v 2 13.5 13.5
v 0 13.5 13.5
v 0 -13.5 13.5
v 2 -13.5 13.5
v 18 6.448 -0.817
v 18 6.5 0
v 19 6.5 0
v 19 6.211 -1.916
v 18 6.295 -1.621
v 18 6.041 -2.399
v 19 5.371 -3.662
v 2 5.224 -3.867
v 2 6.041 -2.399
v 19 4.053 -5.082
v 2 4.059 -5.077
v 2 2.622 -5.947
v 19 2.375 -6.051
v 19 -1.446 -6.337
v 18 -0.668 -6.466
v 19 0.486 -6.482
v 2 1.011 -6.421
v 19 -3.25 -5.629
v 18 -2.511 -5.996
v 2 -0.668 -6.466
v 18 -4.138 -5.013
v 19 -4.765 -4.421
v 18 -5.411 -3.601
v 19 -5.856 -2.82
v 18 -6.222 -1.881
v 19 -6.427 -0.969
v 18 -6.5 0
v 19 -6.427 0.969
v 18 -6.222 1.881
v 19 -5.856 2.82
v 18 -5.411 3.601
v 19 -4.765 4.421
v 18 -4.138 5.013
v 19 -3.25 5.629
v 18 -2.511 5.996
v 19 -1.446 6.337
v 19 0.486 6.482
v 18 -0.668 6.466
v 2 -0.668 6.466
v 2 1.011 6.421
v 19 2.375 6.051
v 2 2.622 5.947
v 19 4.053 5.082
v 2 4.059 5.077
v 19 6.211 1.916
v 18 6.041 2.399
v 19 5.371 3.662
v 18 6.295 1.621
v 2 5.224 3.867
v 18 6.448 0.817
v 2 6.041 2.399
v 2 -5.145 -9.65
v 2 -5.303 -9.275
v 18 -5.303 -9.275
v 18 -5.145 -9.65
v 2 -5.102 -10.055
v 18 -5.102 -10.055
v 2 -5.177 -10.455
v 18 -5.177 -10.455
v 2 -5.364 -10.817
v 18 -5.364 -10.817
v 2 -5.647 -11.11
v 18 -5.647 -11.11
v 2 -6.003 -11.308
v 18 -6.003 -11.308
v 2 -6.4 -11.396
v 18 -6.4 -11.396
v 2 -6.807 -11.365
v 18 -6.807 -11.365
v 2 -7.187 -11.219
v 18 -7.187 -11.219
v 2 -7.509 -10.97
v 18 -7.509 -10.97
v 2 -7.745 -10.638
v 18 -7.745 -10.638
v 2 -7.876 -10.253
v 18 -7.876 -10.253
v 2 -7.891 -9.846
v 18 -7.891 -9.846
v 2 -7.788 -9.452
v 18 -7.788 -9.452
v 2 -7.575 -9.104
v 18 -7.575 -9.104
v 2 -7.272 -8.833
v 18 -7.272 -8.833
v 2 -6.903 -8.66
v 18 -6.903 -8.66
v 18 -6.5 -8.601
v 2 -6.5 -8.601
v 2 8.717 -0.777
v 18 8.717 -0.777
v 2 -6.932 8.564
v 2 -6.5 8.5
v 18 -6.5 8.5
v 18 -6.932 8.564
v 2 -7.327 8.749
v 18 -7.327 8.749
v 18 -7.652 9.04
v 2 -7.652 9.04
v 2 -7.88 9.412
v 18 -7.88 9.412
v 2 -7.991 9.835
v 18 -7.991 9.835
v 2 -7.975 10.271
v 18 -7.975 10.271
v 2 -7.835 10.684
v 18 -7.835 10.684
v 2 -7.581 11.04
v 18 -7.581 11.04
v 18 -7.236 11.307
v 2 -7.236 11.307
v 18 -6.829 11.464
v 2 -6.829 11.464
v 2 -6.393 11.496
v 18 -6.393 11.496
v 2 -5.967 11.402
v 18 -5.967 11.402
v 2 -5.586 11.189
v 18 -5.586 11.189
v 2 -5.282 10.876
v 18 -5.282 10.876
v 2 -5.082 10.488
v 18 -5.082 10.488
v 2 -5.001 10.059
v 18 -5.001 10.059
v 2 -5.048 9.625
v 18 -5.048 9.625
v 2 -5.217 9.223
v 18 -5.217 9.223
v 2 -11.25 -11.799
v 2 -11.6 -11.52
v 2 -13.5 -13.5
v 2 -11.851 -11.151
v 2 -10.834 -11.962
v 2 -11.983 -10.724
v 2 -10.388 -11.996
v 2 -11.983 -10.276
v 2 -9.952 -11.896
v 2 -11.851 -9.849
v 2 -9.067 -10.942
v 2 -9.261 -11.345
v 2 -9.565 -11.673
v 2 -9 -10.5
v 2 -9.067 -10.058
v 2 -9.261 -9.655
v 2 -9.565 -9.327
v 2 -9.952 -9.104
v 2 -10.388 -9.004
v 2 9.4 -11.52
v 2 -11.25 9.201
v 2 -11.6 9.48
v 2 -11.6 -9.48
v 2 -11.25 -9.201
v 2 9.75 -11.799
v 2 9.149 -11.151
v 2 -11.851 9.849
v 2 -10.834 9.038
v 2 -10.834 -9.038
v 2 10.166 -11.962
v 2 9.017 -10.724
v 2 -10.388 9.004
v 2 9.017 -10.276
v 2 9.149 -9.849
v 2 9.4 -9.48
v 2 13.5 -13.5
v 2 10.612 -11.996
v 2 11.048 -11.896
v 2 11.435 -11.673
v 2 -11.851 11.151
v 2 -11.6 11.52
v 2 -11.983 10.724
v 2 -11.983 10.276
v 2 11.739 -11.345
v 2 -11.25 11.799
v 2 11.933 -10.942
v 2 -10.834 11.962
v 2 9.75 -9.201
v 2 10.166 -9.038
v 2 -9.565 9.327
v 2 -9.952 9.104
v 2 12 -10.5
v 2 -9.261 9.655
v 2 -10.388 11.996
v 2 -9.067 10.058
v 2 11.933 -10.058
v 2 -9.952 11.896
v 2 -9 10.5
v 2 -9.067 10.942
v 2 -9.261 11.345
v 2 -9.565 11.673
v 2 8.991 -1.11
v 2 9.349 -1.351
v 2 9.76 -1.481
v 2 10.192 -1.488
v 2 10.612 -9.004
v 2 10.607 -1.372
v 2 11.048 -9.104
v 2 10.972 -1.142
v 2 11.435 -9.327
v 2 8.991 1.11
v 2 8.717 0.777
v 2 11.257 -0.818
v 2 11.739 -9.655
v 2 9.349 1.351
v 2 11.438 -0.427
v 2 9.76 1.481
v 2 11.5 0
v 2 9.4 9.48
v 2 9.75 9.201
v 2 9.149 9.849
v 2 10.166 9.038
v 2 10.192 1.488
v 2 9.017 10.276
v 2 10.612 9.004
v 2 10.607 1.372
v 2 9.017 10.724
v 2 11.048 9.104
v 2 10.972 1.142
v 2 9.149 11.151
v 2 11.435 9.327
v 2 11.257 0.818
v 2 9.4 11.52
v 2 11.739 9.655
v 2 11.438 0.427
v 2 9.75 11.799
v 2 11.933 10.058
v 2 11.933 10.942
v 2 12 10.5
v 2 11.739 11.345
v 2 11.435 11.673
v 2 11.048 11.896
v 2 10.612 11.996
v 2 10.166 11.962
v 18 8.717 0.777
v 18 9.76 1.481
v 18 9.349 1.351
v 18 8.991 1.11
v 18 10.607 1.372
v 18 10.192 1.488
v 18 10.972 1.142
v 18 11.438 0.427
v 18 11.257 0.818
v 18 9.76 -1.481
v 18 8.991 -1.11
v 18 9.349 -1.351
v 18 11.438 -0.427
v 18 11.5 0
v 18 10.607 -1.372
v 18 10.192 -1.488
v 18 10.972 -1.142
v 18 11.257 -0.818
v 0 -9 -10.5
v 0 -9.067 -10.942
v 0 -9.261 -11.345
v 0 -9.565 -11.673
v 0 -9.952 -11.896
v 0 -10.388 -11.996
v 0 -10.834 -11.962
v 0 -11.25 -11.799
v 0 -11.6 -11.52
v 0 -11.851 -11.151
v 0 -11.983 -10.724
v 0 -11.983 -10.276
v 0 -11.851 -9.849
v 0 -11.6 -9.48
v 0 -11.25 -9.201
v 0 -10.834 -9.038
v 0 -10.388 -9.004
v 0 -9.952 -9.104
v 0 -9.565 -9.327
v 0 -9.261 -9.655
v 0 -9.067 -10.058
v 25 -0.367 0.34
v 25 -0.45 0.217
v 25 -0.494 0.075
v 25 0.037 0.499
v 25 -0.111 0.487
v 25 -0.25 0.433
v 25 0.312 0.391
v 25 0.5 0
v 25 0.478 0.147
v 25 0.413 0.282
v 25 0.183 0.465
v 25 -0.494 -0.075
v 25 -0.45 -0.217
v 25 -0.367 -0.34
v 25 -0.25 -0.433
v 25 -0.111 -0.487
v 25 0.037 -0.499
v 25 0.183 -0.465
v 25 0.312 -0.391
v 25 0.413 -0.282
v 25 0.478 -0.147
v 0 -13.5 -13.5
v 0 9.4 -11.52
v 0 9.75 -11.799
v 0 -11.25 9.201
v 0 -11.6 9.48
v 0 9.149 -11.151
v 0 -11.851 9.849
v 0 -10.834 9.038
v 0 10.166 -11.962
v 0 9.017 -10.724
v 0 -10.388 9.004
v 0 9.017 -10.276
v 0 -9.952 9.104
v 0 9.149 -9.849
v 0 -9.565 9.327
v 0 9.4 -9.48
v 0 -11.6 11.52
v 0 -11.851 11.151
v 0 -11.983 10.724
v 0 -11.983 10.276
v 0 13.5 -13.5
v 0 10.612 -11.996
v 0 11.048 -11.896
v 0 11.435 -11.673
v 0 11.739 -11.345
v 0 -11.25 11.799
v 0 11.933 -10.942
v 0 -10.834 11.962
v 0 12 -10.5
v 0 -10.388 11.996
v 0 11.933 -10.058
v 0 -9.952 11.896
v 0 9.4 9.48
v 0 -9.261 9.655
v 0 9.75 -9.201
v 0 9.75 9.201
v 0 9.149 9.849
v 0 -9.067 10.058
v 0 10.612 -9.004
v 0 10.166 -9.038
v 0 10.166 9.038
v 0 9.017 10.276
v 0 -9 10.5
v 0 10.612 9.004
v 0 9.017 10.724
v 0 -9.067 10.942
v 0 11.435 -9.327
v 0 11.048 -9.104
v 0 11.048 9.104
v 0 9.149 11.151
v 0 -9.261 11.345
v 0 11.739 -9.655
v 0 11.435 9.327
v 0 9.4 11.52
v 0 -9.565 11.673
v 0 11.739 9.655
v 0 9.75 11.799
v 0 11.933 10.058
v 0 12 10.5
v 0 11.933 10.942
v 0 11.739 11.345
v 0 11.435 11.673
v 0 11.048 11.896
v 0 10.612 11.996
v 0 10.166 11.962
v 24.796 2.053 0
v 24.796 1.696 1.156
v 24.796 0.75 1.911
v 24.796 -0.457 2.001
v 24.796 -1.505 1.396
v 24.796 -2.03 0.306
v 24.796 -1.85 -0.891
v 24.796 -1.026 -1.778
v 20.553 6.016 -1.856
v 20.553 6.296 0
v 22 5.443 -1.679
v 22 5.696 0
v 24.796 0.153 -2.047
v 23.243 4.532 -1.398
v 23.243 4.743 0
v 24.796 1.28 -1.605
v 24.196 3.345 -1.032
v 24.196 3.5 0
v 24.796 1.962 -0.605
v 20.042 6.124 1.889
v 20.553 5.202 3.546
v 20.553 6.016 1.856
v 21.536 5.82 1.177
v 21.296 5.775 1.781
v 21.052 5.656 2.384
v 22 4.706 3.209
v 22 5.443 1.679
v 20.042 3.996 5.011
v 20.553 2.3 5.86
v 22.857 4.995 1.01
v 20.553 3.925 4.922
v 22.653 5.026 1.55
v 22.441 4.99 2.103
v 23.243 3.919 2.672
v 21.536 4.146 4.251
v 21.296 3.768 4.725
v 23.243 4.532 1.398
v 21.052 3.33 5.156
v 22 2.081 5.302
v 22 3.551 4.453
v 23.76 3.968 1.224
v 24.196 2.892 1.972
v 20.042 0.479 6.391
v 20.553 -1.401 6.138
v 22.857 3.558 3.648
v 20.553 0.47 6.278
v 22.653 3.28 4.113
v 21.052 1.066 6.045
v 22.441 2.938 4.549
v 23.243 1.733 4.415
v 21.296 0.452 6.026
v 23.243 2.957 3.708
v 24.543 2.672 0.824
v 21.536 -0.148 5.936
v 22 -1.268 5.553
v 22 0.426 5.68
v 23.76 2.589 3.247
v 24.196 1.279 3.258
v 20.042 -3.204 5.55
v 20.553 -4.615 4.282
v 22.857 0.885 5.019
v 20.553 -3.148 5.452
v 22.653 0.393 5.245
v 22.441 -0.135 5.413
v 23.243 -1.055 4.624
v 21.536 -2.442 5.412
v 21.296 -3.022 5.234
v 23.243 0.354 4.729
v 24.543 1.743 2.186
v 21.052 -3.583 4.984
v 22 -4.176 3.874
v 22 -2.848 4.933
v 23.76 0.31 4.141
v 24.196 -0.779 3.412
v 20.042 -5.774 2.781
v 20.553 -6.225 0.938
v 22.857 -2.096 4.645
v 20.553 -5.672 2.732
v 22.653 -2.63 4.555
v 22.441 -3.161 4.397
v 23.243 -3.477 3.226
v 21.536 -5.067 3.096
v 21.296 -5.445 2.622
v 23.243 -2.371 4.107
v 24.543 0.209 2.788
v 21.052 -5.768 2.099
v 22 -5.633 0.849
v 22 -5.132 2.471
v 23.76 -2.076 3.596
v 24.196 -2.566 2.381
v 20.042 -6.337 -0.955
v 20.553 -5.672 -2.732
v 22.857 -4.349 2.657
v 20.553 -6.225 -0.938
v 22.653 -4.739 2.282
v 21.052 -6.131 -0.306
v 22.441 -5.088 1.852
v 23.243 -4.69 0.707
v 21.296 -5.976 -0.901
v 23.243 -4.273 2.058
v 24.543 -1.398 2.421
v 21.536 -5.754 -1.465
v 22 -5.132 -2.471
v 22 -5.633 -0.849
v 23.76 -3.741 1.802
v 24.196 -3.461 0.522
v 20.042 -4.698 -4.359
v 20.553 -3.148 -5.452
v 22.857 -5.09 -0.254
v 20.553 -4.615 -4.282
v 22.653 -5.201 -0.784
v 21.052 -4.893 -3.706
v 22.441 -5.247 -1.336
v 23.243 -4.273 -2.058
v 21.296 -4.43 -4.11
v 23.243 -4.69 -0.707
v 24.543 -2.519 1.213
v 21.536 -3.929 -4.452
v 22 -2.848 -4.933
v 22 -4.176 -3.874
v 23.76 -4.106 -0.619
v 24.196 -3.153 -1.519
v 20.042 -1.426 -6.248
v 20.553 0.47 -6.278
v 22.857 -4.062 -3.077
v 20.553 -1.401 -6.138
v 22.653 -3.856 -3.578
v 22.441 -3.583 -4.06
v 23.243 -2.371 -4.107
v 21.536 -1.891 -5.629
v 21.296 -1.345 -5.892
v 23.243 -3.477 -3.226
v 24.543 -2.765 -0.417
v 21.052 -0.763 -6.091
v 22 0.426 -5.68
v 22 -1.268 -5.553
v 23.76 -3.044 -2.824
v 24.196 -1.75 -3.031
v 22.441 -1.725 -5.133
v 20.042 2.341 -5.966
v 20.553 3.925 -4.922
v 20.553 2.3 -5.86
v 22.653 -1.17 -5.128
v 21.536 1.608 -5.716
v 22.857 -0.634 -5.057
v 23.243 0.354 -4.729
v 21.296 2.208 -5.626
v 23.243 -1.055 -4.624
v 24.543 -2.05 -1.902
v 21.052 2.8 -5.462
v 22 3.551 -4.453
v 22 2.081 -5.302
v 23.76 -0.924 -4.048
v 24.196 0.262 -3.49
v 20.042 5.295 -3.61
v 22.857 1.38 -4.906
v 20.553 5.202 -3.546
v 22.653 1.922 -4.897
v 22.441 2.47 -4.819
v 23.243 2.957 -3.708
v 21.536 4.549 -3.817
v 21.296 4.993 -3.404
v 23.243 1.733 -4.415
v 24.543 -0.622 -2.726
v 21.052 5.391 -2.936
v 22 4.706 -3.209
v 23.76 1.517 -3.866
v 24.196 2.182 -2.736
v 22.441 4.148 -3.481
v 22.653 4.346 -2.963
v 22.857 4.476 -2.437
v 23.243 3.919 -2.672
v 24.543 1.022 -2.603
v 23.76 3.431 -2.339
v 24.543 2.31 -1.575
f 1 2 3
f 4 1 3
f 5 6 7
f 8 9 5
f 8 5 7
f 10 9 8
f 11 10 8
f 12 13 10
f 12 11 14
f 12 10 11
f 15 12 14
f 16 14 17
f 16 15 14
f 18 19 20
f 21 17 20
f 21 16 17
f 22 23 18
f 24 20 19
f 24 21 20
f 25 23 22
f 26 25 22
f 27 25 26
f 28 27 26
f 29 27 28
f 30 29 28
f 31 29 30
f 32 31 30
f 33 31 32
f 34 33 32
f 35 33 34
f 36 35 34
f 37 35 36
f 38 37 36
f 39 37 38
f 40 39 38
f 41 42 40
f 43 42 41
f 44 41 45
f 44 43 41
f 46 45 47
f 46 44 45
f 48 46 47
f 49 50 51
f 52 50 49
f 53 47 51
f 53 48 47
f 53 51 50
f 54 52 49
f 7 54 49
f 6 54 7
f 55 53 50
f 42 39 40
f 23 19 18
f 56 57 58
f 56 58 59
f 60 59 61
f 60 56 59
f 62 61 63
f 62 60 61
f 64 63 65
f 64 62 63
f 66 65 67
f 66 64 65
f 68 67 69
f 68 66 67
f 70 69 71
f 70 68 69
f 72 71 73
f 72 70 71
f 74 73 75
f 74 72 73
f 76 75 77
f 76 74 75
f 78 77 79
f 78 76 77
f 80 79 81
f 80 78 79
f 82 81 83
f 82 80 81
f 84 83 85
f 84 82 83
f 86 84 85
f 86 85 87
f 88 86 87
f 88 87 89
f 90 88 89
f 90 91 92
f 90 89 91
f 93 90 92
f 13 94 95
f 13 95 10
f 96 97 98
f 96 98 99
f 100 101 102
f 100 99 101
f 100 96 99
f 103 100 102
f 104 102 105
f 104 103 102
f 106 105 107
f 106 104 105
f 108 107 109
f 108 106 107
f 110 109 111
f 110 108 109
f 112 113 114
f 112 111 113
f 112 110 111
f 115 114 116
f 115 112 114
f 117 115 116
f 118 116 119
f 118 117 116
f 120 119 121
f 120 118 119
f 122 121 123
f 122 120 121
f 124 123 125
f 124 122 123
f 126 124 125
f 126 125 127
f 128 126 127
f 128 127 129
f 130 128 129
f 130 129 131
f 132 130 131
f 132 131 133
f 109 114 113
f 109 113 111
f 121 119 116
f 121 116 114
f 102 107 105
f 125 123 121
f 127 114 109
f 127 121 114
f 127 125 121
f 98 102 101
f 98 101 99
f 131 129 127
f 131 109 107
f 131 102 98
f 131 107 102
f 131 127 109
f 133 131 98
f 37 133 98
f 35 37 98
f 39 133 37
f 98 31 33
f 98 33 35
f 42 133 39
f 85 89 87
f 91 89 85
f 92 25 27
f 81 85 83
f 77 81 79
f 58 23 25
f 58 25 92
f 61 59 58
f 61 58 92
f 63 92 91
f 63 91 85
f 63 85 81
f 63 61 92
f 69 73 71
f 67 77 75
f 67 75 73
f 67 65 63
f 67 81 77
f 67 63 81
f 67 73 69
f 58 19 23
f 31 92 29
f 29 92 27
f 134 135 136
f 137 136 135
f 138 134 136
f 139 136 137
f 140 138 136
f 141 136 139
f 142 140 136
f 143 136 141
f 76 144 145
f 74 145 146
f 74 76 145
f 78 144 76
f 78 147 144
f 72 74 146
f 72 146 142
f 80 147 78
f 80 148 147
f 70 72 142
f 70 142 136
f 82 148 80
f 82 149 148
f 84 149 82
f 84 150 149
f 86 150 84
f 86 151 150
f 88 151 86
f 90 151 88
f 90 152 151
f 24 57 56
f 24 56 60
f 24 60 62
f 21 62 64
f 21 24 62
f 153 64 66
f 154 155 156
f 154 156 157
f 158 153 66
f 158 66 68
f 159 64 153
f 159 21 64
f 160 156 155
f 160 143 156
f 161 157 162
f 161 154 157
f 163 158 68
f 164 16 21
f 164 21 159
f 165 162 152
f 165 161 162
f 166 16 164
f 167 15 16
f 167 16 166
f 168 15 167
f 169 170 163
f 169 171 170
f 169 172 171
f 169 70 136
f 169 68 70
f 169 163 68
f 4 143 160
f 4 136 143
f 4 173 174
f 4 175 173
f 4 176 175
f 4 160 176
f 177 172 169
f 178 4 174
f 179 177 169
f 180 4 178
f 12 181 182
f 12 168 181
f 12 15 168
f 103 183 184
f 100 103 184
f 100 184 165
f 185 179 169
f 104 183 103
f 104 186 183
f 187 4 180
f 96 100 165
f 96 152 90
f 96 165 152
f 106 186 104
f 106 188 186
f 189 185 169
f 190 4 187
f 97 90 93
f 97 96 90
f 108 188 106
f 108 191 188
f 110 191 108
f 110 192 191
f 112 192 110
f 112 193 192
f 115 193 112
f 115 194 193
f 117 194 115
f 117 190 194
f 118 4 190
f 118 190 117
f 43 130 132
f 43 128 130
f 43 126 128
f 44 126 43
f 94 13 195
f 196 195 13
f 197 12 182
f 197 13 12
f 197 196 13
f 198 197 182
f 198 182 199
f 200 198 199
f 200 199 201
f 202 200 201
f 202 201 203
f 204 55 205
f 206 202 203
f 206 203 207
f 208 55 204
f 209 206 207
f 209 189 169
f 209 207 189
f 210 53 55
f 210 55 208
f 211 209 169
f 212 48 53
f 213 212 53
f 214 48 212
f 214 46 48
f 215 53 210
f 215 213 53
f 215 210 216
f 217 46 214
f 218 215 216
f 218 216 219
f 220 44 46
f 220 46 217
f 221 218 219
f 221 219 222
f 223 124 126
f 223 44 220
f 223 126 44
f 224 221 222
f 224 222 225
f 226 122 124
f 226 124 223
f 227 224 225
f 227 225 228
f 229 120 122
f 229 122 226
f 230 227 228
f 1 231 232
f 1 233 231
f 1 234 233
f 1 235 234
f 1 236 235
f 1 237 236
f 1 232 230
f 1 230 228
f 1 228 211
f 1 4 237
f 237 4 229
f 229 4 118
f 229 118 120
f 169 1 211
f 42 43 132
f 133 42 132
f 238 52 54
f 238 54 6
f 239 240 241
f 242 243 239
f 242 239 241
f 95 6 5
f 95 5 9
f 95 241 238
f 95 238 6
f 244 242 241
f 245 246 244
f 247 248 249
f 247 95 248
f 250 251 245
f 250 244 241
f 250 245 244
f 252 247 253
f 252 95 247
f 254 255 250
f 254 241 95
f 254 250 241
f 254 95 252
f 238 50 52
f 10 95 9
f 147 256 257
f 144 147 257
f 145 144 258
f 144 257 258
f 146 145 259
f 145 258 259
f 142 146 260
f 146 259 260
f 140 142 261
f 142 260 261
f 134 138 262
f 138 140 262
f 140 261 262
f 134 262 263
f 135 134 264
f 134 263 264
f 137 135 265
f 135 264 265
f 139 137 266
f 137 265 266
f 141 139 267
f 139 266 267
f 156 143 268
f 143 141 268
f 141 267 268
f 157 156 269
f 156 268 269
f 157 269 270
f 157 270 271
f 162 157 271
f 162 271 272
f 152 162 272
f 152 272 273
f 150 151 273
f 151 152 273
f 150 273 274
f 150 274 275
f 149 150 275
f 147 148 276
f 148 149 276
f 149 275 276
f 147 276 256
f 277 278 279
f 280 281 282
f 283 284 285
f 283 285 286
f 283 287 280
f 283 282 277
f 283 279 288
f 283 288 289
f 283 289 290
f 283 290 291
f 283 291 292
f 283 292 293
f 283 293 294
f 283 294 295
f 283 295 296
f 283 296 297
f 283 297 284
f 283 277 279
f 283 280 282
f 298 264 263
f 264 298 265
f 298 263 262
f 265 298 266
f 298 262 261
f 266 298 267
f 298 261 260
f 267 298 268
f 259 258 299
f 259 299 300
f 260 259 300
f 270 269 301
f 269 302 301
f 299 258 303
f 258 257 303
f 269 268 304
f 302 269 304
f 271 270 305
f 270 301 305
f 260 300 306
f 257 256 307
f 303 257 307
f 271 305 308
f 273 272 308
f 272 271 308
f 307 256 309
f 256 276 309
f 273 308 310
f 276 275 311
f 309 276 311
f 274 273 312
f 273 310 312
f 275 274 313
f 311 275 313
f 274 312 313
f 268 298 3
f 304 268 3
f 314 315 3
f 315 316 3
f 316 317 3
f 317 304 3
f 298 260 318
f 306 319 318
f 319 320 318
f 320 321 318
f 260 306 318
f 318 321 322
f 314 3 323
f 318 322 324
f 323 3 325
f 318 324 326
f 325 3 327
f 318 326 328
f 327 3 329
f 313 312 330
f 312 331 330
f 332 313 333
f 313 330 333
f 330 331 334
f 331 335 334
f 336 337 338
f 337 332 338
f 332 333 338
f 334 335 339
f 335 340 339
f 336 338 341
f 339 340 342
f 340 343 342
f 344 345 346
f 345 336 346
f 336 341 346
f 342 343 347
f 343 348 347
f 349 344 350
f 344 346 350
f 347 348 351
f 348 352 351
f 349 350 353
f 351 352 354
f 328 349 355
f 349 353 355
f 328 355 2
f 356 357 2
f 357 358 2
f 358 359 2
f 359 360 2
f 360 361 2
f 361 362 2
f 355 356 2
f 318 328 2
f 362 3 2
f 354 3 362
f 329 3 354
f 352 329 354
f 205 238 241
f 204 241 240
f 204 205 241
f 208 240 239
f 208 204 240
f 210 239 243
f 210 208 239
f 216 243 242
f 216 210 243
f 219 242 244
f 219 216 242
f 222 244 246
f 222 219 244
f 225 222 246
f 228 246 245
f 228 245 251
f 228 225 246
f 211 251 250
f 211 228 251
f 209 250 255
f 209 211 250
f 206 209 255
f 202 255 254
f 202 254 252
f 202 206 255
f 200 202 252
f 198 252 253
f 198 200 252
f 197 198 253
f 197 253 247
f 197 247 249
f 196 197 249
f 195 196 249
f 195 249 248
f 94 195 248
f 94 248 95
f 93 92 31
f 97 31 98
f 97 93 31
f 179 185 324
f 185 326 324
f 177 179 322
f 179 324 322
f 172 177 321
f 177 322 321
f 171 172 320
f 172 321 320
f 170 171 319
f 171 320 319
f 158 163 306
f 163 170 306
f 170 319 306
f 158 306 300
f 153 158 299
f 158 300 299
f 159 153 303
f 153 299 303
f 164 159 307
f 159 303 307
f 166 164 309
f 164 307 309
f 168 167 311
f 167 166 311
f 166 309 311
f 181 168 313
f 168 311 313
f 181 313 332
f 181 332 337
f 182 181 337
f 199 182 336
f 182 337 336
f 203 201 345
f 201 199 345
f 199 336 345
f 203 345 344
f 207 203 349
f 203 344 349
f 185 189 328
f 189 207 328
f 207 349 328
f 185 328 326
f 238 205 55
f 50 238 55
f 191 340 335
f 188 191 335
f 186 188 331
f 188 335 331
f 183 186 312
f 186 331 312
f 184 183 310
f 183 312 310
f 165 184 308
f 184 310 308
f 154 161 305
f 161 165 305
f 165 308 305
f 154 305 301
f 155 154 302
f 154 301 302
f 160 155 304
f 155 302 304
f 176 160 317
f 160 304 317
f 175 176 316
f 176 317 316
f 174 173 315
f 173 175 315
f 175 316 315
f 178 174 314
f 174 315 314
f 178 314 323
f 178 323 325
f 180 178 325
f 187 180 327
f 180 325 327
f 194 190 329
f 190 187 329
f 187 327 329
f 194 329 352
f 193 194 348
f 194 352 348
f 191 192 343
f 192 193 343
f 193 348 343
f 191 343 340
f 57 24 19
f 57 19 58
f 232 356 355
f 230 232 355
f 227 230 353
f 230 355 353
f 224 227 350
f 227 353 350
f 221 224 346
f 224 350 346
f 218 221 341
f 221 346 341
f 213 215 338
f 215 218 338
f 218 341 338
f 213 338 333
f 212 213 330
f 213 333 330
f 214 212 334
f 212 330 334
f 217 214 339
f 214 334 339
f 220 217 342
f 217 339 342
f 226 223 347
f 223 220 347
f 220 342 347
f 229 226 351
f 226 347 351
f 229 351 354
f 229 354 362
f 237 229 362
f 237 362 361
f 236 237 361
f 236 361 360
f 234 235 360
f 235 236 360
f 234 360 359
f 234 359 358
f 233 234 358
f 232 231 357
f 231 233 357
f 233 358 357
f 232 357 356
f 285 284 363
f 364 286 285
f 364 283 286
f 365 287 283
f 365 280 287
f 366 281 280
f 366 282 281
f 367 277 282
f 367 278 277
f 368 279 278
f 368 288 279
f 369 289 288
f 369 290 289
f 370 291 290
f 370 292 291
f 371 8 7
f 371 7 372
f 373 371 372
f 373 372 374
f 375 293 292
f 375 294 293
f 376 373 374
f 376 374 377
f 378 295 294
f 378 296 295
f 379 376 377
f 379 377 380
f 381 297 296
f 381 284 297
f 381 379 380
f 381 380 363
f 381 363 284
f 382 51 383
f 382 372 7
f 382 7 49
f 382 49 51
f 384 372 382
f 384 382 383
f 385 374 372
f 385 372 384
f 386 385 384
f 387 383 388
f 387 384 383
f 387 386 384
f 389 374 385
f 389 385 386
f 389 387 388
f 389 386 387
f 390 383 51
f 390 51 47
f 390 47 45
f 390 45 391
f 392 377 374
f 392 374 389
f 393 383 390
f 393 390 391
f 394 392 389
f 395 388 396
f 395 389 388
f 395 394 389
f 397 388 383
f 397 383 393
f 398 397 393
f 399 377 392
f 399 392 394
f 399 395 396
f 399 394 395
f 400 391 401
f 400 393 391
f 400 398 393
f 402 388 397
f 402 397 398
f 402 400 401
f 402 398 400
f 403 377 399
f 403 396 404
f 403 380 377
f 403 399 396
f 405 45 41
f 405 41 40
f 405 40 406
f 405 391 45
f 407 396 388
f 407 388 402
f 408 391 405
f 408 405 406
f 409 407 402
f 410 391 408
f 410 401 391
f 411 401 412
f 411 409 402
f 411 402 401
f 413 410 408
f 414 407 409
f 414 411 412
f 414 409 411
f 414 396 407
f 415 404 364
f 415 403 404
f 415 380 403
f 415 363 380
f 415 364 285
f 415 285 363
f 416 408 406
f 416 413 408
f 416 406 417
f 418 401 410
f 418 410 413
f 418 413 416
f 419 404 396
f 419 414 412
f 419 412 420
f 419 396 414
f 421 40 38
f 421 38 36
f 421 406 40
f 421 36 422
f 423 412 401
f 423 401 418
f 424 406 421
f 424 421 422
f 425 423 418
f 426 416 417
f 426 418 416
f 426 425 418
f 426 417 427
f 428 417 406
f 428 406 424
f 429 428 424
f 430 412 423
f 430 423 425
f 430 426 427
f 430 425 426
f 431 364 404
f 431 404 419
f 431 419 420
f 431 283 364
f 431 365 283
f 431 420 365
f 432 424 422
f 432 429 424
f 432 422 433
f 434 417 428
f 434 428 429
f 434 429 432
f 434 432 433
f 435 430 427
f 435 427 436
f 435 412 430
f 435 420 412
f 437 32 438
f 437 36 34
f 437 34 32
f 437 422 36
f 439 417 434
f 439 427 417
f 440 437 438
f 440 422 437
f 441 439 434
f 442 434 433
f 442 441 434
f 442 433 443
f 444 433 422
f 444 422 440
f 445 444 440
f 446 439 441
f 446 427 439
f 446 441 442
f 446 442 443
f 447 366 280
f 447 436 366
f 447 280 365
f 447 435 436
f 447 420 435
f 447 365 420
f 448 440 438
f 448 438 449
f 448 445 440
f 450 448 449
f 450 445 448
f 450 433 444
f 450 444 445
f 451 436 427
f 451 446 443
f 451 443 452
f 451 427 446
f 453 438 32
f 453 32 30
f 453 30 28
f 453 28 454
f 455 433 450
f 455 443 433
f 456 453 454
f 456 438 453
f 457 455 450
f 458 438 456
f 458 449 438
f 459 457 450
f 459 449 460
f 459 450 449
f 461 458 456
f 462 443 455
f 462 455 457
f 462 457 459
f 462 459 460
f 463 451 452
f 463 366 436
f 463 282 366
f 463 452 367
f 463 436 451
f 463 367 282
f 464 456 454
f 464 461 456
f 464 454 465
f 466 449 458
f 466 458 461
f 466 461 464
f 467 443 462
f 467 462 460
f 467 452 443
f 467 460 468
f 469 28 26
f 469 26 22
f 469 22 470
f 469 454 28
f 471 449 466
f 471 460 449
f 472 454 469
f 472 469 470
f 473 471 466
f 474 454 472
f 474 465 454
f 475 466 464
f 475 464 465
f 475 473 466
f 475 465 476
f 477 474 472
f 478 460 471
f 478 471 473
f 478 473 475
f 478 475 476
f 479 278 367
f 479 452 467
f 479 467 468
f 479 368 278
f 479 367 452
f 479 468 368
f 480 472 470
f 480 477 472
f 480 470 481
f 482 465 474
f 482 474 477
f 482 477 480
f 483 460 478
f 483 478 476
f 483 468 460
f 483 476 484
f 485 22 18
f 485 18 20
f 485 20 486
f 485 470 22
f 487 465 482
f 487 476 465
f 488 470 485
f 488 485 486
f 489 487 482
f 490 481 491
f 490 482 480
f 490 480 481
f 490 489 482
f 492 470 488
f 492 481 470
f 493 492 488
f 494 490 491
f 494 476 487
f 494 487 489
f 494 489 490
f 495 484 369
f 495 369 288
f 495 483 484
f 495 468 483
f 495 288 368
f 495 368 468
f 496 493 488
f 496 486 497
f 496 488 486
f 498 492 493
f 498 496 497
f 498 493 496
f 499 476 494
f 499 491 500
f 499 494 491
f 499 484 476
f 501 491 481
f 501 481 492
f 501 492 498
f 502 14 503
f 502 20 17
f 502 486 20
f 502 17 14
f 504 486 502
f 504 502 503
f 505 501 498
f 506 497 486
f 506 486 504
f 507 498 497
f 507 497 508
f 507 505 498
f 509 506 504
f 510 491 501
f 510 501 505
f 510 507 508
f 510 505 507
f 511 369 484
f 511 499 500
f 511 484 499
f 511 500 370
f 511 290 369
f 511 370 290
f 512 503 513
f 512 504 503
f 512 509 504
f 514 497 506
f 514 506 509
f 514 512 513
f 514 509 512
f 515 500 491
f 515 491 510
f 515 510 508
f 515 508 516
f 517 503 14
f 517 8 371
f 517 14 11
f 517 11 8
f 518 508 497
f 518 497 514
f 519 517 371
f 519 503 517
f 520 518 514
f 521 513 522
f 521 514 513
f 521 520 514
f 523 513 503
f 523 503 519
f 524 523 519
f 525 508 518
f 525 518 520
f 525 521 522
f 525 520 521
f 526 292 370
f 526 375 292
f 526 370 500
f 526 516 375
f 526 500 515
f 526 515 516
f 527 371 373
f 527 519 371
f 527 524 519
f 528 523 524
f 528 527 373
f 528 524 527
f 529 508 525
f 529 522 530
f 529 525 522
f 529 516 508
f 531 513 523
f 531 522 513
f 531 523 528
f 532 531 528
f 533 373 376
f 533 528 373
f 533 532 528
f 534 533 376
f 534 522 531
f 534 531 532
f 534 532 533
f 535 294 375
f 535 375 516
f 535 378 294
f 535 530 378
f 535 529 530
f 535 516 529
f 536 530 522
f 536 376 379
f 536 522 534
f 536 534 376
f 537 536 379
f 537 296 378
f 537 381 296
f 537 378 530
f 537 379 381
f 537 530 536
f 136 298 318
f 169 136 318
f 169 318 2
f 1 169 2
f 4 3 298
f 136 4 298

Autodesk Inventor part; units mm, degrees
ref_plane "YZ Plane" through (0, 0, 0) normal (1, 0, 0) x (0, 1, 0)
ref_plane "XZ Plane" through (0, 0, 0) normal (0, 1, 0) x (-1, 0, 0)
ref_plane "XY Plane" through (0, 0, 0) normal (0, 0, 1) x (1, 0, 0)
sketch "スケッチ1" plane through (0, 0, 0) normal (1, 0, 0) x (0, 1, 0)
  line L0 (13.5, 13.5) -> (-13.5, 13.5)
  line L1 (-13.5, 13.5) -> (-13.5, -13.5)
  line L2 (-13.5, -13.5) -> (13.5, -13.5)
  line L3 (13.5, -13.5) -> (13.5, 13.5)
  circle A0 centre (0, 0) radius 6.5
  circle A1 centre (10.5, 10.5) radius 1.5
  circle A2 centre (10.5, -10.5) radius 1.5
  circle A3 centre (-10.5, -10.5) radius 1.5
  circle A4 centre (-10.5, 10.5) radius 1.5
  dimension "d0" = 27
  dimension "d1" = 27
  dimension "d2" = 13.5
  dimension "d3" = 13.5
  dimension "d4" = 13.5
  dimension "d5" = 13.5
  dimension "d6" = 13
  dimension "d7" = 3
  dimension "d8" = 3
  dimension "d9" = 3
  dimension "d10" = 3
  dimension "d11" = 3
  dimension "d12" = 3
  dimension "d13" = 3
  dimension "d14" = 3
  dimension "d15" = 3
  dimension "d16" = 3
  dimension "d17" = 3
  dimension "d18" = 3
extrude "押し出し1" add sketch "スケッチ1" along normal blind 2
extrude "押し出し2" add sketch "スケッチ1" along normal blind 25 contours A0
fillet "フィレット1" radius 6 1 edges at (25, -6.5, 0)
sketch "スケッチ2" plane through (2, 0, 0) normal (1, 0, 0) x (0, 0, -1)
  circle A0 centre (0, 10) radius 1.5
  circle A1 centre (-10, -6.5) radius 1.5
  circle A2 centre (10, -6.5) radius 1.3994
  line L0 (0, 10) -> (10, -6.5)
  line L1 (10, -6.5) -> (-10, -6.5)
  line L2 (0, 10) -> (-10, -6.5)
  line L3 (13.5, 13.5) -> (-13.5, 13.5) projected
  line L4 (13.5, -13.5) -> (13.5, 13.5) projected
  line L5 (-13.5, 13.5) -> (-13.5, -13.5) projected
  line L6 (-13.5, -13.5) -> (13.5, -13.5) projected
  point P0 (0, 0)
  dimension "d25" = 3.5
  dimension "d26" = 3.5
  dimension "d27" = 3.5
  dimension "d28" = 2.7988
  dimension "d29" = 7
  dimension "d30" = 3
  dimension "d31" = 3
extrude "押し出し3" add sketch "スケッチ2" along normal blind 16 contours A0 L0 L2 | L2 L0 A0 | A0 L0 A2 L1 A1 L2 | L2 L1 A1 | A1 L1 L2 | L0 L1 A2 | A2 L1 L0
properties part number "キャスター" material "PAEK 樹脂"
